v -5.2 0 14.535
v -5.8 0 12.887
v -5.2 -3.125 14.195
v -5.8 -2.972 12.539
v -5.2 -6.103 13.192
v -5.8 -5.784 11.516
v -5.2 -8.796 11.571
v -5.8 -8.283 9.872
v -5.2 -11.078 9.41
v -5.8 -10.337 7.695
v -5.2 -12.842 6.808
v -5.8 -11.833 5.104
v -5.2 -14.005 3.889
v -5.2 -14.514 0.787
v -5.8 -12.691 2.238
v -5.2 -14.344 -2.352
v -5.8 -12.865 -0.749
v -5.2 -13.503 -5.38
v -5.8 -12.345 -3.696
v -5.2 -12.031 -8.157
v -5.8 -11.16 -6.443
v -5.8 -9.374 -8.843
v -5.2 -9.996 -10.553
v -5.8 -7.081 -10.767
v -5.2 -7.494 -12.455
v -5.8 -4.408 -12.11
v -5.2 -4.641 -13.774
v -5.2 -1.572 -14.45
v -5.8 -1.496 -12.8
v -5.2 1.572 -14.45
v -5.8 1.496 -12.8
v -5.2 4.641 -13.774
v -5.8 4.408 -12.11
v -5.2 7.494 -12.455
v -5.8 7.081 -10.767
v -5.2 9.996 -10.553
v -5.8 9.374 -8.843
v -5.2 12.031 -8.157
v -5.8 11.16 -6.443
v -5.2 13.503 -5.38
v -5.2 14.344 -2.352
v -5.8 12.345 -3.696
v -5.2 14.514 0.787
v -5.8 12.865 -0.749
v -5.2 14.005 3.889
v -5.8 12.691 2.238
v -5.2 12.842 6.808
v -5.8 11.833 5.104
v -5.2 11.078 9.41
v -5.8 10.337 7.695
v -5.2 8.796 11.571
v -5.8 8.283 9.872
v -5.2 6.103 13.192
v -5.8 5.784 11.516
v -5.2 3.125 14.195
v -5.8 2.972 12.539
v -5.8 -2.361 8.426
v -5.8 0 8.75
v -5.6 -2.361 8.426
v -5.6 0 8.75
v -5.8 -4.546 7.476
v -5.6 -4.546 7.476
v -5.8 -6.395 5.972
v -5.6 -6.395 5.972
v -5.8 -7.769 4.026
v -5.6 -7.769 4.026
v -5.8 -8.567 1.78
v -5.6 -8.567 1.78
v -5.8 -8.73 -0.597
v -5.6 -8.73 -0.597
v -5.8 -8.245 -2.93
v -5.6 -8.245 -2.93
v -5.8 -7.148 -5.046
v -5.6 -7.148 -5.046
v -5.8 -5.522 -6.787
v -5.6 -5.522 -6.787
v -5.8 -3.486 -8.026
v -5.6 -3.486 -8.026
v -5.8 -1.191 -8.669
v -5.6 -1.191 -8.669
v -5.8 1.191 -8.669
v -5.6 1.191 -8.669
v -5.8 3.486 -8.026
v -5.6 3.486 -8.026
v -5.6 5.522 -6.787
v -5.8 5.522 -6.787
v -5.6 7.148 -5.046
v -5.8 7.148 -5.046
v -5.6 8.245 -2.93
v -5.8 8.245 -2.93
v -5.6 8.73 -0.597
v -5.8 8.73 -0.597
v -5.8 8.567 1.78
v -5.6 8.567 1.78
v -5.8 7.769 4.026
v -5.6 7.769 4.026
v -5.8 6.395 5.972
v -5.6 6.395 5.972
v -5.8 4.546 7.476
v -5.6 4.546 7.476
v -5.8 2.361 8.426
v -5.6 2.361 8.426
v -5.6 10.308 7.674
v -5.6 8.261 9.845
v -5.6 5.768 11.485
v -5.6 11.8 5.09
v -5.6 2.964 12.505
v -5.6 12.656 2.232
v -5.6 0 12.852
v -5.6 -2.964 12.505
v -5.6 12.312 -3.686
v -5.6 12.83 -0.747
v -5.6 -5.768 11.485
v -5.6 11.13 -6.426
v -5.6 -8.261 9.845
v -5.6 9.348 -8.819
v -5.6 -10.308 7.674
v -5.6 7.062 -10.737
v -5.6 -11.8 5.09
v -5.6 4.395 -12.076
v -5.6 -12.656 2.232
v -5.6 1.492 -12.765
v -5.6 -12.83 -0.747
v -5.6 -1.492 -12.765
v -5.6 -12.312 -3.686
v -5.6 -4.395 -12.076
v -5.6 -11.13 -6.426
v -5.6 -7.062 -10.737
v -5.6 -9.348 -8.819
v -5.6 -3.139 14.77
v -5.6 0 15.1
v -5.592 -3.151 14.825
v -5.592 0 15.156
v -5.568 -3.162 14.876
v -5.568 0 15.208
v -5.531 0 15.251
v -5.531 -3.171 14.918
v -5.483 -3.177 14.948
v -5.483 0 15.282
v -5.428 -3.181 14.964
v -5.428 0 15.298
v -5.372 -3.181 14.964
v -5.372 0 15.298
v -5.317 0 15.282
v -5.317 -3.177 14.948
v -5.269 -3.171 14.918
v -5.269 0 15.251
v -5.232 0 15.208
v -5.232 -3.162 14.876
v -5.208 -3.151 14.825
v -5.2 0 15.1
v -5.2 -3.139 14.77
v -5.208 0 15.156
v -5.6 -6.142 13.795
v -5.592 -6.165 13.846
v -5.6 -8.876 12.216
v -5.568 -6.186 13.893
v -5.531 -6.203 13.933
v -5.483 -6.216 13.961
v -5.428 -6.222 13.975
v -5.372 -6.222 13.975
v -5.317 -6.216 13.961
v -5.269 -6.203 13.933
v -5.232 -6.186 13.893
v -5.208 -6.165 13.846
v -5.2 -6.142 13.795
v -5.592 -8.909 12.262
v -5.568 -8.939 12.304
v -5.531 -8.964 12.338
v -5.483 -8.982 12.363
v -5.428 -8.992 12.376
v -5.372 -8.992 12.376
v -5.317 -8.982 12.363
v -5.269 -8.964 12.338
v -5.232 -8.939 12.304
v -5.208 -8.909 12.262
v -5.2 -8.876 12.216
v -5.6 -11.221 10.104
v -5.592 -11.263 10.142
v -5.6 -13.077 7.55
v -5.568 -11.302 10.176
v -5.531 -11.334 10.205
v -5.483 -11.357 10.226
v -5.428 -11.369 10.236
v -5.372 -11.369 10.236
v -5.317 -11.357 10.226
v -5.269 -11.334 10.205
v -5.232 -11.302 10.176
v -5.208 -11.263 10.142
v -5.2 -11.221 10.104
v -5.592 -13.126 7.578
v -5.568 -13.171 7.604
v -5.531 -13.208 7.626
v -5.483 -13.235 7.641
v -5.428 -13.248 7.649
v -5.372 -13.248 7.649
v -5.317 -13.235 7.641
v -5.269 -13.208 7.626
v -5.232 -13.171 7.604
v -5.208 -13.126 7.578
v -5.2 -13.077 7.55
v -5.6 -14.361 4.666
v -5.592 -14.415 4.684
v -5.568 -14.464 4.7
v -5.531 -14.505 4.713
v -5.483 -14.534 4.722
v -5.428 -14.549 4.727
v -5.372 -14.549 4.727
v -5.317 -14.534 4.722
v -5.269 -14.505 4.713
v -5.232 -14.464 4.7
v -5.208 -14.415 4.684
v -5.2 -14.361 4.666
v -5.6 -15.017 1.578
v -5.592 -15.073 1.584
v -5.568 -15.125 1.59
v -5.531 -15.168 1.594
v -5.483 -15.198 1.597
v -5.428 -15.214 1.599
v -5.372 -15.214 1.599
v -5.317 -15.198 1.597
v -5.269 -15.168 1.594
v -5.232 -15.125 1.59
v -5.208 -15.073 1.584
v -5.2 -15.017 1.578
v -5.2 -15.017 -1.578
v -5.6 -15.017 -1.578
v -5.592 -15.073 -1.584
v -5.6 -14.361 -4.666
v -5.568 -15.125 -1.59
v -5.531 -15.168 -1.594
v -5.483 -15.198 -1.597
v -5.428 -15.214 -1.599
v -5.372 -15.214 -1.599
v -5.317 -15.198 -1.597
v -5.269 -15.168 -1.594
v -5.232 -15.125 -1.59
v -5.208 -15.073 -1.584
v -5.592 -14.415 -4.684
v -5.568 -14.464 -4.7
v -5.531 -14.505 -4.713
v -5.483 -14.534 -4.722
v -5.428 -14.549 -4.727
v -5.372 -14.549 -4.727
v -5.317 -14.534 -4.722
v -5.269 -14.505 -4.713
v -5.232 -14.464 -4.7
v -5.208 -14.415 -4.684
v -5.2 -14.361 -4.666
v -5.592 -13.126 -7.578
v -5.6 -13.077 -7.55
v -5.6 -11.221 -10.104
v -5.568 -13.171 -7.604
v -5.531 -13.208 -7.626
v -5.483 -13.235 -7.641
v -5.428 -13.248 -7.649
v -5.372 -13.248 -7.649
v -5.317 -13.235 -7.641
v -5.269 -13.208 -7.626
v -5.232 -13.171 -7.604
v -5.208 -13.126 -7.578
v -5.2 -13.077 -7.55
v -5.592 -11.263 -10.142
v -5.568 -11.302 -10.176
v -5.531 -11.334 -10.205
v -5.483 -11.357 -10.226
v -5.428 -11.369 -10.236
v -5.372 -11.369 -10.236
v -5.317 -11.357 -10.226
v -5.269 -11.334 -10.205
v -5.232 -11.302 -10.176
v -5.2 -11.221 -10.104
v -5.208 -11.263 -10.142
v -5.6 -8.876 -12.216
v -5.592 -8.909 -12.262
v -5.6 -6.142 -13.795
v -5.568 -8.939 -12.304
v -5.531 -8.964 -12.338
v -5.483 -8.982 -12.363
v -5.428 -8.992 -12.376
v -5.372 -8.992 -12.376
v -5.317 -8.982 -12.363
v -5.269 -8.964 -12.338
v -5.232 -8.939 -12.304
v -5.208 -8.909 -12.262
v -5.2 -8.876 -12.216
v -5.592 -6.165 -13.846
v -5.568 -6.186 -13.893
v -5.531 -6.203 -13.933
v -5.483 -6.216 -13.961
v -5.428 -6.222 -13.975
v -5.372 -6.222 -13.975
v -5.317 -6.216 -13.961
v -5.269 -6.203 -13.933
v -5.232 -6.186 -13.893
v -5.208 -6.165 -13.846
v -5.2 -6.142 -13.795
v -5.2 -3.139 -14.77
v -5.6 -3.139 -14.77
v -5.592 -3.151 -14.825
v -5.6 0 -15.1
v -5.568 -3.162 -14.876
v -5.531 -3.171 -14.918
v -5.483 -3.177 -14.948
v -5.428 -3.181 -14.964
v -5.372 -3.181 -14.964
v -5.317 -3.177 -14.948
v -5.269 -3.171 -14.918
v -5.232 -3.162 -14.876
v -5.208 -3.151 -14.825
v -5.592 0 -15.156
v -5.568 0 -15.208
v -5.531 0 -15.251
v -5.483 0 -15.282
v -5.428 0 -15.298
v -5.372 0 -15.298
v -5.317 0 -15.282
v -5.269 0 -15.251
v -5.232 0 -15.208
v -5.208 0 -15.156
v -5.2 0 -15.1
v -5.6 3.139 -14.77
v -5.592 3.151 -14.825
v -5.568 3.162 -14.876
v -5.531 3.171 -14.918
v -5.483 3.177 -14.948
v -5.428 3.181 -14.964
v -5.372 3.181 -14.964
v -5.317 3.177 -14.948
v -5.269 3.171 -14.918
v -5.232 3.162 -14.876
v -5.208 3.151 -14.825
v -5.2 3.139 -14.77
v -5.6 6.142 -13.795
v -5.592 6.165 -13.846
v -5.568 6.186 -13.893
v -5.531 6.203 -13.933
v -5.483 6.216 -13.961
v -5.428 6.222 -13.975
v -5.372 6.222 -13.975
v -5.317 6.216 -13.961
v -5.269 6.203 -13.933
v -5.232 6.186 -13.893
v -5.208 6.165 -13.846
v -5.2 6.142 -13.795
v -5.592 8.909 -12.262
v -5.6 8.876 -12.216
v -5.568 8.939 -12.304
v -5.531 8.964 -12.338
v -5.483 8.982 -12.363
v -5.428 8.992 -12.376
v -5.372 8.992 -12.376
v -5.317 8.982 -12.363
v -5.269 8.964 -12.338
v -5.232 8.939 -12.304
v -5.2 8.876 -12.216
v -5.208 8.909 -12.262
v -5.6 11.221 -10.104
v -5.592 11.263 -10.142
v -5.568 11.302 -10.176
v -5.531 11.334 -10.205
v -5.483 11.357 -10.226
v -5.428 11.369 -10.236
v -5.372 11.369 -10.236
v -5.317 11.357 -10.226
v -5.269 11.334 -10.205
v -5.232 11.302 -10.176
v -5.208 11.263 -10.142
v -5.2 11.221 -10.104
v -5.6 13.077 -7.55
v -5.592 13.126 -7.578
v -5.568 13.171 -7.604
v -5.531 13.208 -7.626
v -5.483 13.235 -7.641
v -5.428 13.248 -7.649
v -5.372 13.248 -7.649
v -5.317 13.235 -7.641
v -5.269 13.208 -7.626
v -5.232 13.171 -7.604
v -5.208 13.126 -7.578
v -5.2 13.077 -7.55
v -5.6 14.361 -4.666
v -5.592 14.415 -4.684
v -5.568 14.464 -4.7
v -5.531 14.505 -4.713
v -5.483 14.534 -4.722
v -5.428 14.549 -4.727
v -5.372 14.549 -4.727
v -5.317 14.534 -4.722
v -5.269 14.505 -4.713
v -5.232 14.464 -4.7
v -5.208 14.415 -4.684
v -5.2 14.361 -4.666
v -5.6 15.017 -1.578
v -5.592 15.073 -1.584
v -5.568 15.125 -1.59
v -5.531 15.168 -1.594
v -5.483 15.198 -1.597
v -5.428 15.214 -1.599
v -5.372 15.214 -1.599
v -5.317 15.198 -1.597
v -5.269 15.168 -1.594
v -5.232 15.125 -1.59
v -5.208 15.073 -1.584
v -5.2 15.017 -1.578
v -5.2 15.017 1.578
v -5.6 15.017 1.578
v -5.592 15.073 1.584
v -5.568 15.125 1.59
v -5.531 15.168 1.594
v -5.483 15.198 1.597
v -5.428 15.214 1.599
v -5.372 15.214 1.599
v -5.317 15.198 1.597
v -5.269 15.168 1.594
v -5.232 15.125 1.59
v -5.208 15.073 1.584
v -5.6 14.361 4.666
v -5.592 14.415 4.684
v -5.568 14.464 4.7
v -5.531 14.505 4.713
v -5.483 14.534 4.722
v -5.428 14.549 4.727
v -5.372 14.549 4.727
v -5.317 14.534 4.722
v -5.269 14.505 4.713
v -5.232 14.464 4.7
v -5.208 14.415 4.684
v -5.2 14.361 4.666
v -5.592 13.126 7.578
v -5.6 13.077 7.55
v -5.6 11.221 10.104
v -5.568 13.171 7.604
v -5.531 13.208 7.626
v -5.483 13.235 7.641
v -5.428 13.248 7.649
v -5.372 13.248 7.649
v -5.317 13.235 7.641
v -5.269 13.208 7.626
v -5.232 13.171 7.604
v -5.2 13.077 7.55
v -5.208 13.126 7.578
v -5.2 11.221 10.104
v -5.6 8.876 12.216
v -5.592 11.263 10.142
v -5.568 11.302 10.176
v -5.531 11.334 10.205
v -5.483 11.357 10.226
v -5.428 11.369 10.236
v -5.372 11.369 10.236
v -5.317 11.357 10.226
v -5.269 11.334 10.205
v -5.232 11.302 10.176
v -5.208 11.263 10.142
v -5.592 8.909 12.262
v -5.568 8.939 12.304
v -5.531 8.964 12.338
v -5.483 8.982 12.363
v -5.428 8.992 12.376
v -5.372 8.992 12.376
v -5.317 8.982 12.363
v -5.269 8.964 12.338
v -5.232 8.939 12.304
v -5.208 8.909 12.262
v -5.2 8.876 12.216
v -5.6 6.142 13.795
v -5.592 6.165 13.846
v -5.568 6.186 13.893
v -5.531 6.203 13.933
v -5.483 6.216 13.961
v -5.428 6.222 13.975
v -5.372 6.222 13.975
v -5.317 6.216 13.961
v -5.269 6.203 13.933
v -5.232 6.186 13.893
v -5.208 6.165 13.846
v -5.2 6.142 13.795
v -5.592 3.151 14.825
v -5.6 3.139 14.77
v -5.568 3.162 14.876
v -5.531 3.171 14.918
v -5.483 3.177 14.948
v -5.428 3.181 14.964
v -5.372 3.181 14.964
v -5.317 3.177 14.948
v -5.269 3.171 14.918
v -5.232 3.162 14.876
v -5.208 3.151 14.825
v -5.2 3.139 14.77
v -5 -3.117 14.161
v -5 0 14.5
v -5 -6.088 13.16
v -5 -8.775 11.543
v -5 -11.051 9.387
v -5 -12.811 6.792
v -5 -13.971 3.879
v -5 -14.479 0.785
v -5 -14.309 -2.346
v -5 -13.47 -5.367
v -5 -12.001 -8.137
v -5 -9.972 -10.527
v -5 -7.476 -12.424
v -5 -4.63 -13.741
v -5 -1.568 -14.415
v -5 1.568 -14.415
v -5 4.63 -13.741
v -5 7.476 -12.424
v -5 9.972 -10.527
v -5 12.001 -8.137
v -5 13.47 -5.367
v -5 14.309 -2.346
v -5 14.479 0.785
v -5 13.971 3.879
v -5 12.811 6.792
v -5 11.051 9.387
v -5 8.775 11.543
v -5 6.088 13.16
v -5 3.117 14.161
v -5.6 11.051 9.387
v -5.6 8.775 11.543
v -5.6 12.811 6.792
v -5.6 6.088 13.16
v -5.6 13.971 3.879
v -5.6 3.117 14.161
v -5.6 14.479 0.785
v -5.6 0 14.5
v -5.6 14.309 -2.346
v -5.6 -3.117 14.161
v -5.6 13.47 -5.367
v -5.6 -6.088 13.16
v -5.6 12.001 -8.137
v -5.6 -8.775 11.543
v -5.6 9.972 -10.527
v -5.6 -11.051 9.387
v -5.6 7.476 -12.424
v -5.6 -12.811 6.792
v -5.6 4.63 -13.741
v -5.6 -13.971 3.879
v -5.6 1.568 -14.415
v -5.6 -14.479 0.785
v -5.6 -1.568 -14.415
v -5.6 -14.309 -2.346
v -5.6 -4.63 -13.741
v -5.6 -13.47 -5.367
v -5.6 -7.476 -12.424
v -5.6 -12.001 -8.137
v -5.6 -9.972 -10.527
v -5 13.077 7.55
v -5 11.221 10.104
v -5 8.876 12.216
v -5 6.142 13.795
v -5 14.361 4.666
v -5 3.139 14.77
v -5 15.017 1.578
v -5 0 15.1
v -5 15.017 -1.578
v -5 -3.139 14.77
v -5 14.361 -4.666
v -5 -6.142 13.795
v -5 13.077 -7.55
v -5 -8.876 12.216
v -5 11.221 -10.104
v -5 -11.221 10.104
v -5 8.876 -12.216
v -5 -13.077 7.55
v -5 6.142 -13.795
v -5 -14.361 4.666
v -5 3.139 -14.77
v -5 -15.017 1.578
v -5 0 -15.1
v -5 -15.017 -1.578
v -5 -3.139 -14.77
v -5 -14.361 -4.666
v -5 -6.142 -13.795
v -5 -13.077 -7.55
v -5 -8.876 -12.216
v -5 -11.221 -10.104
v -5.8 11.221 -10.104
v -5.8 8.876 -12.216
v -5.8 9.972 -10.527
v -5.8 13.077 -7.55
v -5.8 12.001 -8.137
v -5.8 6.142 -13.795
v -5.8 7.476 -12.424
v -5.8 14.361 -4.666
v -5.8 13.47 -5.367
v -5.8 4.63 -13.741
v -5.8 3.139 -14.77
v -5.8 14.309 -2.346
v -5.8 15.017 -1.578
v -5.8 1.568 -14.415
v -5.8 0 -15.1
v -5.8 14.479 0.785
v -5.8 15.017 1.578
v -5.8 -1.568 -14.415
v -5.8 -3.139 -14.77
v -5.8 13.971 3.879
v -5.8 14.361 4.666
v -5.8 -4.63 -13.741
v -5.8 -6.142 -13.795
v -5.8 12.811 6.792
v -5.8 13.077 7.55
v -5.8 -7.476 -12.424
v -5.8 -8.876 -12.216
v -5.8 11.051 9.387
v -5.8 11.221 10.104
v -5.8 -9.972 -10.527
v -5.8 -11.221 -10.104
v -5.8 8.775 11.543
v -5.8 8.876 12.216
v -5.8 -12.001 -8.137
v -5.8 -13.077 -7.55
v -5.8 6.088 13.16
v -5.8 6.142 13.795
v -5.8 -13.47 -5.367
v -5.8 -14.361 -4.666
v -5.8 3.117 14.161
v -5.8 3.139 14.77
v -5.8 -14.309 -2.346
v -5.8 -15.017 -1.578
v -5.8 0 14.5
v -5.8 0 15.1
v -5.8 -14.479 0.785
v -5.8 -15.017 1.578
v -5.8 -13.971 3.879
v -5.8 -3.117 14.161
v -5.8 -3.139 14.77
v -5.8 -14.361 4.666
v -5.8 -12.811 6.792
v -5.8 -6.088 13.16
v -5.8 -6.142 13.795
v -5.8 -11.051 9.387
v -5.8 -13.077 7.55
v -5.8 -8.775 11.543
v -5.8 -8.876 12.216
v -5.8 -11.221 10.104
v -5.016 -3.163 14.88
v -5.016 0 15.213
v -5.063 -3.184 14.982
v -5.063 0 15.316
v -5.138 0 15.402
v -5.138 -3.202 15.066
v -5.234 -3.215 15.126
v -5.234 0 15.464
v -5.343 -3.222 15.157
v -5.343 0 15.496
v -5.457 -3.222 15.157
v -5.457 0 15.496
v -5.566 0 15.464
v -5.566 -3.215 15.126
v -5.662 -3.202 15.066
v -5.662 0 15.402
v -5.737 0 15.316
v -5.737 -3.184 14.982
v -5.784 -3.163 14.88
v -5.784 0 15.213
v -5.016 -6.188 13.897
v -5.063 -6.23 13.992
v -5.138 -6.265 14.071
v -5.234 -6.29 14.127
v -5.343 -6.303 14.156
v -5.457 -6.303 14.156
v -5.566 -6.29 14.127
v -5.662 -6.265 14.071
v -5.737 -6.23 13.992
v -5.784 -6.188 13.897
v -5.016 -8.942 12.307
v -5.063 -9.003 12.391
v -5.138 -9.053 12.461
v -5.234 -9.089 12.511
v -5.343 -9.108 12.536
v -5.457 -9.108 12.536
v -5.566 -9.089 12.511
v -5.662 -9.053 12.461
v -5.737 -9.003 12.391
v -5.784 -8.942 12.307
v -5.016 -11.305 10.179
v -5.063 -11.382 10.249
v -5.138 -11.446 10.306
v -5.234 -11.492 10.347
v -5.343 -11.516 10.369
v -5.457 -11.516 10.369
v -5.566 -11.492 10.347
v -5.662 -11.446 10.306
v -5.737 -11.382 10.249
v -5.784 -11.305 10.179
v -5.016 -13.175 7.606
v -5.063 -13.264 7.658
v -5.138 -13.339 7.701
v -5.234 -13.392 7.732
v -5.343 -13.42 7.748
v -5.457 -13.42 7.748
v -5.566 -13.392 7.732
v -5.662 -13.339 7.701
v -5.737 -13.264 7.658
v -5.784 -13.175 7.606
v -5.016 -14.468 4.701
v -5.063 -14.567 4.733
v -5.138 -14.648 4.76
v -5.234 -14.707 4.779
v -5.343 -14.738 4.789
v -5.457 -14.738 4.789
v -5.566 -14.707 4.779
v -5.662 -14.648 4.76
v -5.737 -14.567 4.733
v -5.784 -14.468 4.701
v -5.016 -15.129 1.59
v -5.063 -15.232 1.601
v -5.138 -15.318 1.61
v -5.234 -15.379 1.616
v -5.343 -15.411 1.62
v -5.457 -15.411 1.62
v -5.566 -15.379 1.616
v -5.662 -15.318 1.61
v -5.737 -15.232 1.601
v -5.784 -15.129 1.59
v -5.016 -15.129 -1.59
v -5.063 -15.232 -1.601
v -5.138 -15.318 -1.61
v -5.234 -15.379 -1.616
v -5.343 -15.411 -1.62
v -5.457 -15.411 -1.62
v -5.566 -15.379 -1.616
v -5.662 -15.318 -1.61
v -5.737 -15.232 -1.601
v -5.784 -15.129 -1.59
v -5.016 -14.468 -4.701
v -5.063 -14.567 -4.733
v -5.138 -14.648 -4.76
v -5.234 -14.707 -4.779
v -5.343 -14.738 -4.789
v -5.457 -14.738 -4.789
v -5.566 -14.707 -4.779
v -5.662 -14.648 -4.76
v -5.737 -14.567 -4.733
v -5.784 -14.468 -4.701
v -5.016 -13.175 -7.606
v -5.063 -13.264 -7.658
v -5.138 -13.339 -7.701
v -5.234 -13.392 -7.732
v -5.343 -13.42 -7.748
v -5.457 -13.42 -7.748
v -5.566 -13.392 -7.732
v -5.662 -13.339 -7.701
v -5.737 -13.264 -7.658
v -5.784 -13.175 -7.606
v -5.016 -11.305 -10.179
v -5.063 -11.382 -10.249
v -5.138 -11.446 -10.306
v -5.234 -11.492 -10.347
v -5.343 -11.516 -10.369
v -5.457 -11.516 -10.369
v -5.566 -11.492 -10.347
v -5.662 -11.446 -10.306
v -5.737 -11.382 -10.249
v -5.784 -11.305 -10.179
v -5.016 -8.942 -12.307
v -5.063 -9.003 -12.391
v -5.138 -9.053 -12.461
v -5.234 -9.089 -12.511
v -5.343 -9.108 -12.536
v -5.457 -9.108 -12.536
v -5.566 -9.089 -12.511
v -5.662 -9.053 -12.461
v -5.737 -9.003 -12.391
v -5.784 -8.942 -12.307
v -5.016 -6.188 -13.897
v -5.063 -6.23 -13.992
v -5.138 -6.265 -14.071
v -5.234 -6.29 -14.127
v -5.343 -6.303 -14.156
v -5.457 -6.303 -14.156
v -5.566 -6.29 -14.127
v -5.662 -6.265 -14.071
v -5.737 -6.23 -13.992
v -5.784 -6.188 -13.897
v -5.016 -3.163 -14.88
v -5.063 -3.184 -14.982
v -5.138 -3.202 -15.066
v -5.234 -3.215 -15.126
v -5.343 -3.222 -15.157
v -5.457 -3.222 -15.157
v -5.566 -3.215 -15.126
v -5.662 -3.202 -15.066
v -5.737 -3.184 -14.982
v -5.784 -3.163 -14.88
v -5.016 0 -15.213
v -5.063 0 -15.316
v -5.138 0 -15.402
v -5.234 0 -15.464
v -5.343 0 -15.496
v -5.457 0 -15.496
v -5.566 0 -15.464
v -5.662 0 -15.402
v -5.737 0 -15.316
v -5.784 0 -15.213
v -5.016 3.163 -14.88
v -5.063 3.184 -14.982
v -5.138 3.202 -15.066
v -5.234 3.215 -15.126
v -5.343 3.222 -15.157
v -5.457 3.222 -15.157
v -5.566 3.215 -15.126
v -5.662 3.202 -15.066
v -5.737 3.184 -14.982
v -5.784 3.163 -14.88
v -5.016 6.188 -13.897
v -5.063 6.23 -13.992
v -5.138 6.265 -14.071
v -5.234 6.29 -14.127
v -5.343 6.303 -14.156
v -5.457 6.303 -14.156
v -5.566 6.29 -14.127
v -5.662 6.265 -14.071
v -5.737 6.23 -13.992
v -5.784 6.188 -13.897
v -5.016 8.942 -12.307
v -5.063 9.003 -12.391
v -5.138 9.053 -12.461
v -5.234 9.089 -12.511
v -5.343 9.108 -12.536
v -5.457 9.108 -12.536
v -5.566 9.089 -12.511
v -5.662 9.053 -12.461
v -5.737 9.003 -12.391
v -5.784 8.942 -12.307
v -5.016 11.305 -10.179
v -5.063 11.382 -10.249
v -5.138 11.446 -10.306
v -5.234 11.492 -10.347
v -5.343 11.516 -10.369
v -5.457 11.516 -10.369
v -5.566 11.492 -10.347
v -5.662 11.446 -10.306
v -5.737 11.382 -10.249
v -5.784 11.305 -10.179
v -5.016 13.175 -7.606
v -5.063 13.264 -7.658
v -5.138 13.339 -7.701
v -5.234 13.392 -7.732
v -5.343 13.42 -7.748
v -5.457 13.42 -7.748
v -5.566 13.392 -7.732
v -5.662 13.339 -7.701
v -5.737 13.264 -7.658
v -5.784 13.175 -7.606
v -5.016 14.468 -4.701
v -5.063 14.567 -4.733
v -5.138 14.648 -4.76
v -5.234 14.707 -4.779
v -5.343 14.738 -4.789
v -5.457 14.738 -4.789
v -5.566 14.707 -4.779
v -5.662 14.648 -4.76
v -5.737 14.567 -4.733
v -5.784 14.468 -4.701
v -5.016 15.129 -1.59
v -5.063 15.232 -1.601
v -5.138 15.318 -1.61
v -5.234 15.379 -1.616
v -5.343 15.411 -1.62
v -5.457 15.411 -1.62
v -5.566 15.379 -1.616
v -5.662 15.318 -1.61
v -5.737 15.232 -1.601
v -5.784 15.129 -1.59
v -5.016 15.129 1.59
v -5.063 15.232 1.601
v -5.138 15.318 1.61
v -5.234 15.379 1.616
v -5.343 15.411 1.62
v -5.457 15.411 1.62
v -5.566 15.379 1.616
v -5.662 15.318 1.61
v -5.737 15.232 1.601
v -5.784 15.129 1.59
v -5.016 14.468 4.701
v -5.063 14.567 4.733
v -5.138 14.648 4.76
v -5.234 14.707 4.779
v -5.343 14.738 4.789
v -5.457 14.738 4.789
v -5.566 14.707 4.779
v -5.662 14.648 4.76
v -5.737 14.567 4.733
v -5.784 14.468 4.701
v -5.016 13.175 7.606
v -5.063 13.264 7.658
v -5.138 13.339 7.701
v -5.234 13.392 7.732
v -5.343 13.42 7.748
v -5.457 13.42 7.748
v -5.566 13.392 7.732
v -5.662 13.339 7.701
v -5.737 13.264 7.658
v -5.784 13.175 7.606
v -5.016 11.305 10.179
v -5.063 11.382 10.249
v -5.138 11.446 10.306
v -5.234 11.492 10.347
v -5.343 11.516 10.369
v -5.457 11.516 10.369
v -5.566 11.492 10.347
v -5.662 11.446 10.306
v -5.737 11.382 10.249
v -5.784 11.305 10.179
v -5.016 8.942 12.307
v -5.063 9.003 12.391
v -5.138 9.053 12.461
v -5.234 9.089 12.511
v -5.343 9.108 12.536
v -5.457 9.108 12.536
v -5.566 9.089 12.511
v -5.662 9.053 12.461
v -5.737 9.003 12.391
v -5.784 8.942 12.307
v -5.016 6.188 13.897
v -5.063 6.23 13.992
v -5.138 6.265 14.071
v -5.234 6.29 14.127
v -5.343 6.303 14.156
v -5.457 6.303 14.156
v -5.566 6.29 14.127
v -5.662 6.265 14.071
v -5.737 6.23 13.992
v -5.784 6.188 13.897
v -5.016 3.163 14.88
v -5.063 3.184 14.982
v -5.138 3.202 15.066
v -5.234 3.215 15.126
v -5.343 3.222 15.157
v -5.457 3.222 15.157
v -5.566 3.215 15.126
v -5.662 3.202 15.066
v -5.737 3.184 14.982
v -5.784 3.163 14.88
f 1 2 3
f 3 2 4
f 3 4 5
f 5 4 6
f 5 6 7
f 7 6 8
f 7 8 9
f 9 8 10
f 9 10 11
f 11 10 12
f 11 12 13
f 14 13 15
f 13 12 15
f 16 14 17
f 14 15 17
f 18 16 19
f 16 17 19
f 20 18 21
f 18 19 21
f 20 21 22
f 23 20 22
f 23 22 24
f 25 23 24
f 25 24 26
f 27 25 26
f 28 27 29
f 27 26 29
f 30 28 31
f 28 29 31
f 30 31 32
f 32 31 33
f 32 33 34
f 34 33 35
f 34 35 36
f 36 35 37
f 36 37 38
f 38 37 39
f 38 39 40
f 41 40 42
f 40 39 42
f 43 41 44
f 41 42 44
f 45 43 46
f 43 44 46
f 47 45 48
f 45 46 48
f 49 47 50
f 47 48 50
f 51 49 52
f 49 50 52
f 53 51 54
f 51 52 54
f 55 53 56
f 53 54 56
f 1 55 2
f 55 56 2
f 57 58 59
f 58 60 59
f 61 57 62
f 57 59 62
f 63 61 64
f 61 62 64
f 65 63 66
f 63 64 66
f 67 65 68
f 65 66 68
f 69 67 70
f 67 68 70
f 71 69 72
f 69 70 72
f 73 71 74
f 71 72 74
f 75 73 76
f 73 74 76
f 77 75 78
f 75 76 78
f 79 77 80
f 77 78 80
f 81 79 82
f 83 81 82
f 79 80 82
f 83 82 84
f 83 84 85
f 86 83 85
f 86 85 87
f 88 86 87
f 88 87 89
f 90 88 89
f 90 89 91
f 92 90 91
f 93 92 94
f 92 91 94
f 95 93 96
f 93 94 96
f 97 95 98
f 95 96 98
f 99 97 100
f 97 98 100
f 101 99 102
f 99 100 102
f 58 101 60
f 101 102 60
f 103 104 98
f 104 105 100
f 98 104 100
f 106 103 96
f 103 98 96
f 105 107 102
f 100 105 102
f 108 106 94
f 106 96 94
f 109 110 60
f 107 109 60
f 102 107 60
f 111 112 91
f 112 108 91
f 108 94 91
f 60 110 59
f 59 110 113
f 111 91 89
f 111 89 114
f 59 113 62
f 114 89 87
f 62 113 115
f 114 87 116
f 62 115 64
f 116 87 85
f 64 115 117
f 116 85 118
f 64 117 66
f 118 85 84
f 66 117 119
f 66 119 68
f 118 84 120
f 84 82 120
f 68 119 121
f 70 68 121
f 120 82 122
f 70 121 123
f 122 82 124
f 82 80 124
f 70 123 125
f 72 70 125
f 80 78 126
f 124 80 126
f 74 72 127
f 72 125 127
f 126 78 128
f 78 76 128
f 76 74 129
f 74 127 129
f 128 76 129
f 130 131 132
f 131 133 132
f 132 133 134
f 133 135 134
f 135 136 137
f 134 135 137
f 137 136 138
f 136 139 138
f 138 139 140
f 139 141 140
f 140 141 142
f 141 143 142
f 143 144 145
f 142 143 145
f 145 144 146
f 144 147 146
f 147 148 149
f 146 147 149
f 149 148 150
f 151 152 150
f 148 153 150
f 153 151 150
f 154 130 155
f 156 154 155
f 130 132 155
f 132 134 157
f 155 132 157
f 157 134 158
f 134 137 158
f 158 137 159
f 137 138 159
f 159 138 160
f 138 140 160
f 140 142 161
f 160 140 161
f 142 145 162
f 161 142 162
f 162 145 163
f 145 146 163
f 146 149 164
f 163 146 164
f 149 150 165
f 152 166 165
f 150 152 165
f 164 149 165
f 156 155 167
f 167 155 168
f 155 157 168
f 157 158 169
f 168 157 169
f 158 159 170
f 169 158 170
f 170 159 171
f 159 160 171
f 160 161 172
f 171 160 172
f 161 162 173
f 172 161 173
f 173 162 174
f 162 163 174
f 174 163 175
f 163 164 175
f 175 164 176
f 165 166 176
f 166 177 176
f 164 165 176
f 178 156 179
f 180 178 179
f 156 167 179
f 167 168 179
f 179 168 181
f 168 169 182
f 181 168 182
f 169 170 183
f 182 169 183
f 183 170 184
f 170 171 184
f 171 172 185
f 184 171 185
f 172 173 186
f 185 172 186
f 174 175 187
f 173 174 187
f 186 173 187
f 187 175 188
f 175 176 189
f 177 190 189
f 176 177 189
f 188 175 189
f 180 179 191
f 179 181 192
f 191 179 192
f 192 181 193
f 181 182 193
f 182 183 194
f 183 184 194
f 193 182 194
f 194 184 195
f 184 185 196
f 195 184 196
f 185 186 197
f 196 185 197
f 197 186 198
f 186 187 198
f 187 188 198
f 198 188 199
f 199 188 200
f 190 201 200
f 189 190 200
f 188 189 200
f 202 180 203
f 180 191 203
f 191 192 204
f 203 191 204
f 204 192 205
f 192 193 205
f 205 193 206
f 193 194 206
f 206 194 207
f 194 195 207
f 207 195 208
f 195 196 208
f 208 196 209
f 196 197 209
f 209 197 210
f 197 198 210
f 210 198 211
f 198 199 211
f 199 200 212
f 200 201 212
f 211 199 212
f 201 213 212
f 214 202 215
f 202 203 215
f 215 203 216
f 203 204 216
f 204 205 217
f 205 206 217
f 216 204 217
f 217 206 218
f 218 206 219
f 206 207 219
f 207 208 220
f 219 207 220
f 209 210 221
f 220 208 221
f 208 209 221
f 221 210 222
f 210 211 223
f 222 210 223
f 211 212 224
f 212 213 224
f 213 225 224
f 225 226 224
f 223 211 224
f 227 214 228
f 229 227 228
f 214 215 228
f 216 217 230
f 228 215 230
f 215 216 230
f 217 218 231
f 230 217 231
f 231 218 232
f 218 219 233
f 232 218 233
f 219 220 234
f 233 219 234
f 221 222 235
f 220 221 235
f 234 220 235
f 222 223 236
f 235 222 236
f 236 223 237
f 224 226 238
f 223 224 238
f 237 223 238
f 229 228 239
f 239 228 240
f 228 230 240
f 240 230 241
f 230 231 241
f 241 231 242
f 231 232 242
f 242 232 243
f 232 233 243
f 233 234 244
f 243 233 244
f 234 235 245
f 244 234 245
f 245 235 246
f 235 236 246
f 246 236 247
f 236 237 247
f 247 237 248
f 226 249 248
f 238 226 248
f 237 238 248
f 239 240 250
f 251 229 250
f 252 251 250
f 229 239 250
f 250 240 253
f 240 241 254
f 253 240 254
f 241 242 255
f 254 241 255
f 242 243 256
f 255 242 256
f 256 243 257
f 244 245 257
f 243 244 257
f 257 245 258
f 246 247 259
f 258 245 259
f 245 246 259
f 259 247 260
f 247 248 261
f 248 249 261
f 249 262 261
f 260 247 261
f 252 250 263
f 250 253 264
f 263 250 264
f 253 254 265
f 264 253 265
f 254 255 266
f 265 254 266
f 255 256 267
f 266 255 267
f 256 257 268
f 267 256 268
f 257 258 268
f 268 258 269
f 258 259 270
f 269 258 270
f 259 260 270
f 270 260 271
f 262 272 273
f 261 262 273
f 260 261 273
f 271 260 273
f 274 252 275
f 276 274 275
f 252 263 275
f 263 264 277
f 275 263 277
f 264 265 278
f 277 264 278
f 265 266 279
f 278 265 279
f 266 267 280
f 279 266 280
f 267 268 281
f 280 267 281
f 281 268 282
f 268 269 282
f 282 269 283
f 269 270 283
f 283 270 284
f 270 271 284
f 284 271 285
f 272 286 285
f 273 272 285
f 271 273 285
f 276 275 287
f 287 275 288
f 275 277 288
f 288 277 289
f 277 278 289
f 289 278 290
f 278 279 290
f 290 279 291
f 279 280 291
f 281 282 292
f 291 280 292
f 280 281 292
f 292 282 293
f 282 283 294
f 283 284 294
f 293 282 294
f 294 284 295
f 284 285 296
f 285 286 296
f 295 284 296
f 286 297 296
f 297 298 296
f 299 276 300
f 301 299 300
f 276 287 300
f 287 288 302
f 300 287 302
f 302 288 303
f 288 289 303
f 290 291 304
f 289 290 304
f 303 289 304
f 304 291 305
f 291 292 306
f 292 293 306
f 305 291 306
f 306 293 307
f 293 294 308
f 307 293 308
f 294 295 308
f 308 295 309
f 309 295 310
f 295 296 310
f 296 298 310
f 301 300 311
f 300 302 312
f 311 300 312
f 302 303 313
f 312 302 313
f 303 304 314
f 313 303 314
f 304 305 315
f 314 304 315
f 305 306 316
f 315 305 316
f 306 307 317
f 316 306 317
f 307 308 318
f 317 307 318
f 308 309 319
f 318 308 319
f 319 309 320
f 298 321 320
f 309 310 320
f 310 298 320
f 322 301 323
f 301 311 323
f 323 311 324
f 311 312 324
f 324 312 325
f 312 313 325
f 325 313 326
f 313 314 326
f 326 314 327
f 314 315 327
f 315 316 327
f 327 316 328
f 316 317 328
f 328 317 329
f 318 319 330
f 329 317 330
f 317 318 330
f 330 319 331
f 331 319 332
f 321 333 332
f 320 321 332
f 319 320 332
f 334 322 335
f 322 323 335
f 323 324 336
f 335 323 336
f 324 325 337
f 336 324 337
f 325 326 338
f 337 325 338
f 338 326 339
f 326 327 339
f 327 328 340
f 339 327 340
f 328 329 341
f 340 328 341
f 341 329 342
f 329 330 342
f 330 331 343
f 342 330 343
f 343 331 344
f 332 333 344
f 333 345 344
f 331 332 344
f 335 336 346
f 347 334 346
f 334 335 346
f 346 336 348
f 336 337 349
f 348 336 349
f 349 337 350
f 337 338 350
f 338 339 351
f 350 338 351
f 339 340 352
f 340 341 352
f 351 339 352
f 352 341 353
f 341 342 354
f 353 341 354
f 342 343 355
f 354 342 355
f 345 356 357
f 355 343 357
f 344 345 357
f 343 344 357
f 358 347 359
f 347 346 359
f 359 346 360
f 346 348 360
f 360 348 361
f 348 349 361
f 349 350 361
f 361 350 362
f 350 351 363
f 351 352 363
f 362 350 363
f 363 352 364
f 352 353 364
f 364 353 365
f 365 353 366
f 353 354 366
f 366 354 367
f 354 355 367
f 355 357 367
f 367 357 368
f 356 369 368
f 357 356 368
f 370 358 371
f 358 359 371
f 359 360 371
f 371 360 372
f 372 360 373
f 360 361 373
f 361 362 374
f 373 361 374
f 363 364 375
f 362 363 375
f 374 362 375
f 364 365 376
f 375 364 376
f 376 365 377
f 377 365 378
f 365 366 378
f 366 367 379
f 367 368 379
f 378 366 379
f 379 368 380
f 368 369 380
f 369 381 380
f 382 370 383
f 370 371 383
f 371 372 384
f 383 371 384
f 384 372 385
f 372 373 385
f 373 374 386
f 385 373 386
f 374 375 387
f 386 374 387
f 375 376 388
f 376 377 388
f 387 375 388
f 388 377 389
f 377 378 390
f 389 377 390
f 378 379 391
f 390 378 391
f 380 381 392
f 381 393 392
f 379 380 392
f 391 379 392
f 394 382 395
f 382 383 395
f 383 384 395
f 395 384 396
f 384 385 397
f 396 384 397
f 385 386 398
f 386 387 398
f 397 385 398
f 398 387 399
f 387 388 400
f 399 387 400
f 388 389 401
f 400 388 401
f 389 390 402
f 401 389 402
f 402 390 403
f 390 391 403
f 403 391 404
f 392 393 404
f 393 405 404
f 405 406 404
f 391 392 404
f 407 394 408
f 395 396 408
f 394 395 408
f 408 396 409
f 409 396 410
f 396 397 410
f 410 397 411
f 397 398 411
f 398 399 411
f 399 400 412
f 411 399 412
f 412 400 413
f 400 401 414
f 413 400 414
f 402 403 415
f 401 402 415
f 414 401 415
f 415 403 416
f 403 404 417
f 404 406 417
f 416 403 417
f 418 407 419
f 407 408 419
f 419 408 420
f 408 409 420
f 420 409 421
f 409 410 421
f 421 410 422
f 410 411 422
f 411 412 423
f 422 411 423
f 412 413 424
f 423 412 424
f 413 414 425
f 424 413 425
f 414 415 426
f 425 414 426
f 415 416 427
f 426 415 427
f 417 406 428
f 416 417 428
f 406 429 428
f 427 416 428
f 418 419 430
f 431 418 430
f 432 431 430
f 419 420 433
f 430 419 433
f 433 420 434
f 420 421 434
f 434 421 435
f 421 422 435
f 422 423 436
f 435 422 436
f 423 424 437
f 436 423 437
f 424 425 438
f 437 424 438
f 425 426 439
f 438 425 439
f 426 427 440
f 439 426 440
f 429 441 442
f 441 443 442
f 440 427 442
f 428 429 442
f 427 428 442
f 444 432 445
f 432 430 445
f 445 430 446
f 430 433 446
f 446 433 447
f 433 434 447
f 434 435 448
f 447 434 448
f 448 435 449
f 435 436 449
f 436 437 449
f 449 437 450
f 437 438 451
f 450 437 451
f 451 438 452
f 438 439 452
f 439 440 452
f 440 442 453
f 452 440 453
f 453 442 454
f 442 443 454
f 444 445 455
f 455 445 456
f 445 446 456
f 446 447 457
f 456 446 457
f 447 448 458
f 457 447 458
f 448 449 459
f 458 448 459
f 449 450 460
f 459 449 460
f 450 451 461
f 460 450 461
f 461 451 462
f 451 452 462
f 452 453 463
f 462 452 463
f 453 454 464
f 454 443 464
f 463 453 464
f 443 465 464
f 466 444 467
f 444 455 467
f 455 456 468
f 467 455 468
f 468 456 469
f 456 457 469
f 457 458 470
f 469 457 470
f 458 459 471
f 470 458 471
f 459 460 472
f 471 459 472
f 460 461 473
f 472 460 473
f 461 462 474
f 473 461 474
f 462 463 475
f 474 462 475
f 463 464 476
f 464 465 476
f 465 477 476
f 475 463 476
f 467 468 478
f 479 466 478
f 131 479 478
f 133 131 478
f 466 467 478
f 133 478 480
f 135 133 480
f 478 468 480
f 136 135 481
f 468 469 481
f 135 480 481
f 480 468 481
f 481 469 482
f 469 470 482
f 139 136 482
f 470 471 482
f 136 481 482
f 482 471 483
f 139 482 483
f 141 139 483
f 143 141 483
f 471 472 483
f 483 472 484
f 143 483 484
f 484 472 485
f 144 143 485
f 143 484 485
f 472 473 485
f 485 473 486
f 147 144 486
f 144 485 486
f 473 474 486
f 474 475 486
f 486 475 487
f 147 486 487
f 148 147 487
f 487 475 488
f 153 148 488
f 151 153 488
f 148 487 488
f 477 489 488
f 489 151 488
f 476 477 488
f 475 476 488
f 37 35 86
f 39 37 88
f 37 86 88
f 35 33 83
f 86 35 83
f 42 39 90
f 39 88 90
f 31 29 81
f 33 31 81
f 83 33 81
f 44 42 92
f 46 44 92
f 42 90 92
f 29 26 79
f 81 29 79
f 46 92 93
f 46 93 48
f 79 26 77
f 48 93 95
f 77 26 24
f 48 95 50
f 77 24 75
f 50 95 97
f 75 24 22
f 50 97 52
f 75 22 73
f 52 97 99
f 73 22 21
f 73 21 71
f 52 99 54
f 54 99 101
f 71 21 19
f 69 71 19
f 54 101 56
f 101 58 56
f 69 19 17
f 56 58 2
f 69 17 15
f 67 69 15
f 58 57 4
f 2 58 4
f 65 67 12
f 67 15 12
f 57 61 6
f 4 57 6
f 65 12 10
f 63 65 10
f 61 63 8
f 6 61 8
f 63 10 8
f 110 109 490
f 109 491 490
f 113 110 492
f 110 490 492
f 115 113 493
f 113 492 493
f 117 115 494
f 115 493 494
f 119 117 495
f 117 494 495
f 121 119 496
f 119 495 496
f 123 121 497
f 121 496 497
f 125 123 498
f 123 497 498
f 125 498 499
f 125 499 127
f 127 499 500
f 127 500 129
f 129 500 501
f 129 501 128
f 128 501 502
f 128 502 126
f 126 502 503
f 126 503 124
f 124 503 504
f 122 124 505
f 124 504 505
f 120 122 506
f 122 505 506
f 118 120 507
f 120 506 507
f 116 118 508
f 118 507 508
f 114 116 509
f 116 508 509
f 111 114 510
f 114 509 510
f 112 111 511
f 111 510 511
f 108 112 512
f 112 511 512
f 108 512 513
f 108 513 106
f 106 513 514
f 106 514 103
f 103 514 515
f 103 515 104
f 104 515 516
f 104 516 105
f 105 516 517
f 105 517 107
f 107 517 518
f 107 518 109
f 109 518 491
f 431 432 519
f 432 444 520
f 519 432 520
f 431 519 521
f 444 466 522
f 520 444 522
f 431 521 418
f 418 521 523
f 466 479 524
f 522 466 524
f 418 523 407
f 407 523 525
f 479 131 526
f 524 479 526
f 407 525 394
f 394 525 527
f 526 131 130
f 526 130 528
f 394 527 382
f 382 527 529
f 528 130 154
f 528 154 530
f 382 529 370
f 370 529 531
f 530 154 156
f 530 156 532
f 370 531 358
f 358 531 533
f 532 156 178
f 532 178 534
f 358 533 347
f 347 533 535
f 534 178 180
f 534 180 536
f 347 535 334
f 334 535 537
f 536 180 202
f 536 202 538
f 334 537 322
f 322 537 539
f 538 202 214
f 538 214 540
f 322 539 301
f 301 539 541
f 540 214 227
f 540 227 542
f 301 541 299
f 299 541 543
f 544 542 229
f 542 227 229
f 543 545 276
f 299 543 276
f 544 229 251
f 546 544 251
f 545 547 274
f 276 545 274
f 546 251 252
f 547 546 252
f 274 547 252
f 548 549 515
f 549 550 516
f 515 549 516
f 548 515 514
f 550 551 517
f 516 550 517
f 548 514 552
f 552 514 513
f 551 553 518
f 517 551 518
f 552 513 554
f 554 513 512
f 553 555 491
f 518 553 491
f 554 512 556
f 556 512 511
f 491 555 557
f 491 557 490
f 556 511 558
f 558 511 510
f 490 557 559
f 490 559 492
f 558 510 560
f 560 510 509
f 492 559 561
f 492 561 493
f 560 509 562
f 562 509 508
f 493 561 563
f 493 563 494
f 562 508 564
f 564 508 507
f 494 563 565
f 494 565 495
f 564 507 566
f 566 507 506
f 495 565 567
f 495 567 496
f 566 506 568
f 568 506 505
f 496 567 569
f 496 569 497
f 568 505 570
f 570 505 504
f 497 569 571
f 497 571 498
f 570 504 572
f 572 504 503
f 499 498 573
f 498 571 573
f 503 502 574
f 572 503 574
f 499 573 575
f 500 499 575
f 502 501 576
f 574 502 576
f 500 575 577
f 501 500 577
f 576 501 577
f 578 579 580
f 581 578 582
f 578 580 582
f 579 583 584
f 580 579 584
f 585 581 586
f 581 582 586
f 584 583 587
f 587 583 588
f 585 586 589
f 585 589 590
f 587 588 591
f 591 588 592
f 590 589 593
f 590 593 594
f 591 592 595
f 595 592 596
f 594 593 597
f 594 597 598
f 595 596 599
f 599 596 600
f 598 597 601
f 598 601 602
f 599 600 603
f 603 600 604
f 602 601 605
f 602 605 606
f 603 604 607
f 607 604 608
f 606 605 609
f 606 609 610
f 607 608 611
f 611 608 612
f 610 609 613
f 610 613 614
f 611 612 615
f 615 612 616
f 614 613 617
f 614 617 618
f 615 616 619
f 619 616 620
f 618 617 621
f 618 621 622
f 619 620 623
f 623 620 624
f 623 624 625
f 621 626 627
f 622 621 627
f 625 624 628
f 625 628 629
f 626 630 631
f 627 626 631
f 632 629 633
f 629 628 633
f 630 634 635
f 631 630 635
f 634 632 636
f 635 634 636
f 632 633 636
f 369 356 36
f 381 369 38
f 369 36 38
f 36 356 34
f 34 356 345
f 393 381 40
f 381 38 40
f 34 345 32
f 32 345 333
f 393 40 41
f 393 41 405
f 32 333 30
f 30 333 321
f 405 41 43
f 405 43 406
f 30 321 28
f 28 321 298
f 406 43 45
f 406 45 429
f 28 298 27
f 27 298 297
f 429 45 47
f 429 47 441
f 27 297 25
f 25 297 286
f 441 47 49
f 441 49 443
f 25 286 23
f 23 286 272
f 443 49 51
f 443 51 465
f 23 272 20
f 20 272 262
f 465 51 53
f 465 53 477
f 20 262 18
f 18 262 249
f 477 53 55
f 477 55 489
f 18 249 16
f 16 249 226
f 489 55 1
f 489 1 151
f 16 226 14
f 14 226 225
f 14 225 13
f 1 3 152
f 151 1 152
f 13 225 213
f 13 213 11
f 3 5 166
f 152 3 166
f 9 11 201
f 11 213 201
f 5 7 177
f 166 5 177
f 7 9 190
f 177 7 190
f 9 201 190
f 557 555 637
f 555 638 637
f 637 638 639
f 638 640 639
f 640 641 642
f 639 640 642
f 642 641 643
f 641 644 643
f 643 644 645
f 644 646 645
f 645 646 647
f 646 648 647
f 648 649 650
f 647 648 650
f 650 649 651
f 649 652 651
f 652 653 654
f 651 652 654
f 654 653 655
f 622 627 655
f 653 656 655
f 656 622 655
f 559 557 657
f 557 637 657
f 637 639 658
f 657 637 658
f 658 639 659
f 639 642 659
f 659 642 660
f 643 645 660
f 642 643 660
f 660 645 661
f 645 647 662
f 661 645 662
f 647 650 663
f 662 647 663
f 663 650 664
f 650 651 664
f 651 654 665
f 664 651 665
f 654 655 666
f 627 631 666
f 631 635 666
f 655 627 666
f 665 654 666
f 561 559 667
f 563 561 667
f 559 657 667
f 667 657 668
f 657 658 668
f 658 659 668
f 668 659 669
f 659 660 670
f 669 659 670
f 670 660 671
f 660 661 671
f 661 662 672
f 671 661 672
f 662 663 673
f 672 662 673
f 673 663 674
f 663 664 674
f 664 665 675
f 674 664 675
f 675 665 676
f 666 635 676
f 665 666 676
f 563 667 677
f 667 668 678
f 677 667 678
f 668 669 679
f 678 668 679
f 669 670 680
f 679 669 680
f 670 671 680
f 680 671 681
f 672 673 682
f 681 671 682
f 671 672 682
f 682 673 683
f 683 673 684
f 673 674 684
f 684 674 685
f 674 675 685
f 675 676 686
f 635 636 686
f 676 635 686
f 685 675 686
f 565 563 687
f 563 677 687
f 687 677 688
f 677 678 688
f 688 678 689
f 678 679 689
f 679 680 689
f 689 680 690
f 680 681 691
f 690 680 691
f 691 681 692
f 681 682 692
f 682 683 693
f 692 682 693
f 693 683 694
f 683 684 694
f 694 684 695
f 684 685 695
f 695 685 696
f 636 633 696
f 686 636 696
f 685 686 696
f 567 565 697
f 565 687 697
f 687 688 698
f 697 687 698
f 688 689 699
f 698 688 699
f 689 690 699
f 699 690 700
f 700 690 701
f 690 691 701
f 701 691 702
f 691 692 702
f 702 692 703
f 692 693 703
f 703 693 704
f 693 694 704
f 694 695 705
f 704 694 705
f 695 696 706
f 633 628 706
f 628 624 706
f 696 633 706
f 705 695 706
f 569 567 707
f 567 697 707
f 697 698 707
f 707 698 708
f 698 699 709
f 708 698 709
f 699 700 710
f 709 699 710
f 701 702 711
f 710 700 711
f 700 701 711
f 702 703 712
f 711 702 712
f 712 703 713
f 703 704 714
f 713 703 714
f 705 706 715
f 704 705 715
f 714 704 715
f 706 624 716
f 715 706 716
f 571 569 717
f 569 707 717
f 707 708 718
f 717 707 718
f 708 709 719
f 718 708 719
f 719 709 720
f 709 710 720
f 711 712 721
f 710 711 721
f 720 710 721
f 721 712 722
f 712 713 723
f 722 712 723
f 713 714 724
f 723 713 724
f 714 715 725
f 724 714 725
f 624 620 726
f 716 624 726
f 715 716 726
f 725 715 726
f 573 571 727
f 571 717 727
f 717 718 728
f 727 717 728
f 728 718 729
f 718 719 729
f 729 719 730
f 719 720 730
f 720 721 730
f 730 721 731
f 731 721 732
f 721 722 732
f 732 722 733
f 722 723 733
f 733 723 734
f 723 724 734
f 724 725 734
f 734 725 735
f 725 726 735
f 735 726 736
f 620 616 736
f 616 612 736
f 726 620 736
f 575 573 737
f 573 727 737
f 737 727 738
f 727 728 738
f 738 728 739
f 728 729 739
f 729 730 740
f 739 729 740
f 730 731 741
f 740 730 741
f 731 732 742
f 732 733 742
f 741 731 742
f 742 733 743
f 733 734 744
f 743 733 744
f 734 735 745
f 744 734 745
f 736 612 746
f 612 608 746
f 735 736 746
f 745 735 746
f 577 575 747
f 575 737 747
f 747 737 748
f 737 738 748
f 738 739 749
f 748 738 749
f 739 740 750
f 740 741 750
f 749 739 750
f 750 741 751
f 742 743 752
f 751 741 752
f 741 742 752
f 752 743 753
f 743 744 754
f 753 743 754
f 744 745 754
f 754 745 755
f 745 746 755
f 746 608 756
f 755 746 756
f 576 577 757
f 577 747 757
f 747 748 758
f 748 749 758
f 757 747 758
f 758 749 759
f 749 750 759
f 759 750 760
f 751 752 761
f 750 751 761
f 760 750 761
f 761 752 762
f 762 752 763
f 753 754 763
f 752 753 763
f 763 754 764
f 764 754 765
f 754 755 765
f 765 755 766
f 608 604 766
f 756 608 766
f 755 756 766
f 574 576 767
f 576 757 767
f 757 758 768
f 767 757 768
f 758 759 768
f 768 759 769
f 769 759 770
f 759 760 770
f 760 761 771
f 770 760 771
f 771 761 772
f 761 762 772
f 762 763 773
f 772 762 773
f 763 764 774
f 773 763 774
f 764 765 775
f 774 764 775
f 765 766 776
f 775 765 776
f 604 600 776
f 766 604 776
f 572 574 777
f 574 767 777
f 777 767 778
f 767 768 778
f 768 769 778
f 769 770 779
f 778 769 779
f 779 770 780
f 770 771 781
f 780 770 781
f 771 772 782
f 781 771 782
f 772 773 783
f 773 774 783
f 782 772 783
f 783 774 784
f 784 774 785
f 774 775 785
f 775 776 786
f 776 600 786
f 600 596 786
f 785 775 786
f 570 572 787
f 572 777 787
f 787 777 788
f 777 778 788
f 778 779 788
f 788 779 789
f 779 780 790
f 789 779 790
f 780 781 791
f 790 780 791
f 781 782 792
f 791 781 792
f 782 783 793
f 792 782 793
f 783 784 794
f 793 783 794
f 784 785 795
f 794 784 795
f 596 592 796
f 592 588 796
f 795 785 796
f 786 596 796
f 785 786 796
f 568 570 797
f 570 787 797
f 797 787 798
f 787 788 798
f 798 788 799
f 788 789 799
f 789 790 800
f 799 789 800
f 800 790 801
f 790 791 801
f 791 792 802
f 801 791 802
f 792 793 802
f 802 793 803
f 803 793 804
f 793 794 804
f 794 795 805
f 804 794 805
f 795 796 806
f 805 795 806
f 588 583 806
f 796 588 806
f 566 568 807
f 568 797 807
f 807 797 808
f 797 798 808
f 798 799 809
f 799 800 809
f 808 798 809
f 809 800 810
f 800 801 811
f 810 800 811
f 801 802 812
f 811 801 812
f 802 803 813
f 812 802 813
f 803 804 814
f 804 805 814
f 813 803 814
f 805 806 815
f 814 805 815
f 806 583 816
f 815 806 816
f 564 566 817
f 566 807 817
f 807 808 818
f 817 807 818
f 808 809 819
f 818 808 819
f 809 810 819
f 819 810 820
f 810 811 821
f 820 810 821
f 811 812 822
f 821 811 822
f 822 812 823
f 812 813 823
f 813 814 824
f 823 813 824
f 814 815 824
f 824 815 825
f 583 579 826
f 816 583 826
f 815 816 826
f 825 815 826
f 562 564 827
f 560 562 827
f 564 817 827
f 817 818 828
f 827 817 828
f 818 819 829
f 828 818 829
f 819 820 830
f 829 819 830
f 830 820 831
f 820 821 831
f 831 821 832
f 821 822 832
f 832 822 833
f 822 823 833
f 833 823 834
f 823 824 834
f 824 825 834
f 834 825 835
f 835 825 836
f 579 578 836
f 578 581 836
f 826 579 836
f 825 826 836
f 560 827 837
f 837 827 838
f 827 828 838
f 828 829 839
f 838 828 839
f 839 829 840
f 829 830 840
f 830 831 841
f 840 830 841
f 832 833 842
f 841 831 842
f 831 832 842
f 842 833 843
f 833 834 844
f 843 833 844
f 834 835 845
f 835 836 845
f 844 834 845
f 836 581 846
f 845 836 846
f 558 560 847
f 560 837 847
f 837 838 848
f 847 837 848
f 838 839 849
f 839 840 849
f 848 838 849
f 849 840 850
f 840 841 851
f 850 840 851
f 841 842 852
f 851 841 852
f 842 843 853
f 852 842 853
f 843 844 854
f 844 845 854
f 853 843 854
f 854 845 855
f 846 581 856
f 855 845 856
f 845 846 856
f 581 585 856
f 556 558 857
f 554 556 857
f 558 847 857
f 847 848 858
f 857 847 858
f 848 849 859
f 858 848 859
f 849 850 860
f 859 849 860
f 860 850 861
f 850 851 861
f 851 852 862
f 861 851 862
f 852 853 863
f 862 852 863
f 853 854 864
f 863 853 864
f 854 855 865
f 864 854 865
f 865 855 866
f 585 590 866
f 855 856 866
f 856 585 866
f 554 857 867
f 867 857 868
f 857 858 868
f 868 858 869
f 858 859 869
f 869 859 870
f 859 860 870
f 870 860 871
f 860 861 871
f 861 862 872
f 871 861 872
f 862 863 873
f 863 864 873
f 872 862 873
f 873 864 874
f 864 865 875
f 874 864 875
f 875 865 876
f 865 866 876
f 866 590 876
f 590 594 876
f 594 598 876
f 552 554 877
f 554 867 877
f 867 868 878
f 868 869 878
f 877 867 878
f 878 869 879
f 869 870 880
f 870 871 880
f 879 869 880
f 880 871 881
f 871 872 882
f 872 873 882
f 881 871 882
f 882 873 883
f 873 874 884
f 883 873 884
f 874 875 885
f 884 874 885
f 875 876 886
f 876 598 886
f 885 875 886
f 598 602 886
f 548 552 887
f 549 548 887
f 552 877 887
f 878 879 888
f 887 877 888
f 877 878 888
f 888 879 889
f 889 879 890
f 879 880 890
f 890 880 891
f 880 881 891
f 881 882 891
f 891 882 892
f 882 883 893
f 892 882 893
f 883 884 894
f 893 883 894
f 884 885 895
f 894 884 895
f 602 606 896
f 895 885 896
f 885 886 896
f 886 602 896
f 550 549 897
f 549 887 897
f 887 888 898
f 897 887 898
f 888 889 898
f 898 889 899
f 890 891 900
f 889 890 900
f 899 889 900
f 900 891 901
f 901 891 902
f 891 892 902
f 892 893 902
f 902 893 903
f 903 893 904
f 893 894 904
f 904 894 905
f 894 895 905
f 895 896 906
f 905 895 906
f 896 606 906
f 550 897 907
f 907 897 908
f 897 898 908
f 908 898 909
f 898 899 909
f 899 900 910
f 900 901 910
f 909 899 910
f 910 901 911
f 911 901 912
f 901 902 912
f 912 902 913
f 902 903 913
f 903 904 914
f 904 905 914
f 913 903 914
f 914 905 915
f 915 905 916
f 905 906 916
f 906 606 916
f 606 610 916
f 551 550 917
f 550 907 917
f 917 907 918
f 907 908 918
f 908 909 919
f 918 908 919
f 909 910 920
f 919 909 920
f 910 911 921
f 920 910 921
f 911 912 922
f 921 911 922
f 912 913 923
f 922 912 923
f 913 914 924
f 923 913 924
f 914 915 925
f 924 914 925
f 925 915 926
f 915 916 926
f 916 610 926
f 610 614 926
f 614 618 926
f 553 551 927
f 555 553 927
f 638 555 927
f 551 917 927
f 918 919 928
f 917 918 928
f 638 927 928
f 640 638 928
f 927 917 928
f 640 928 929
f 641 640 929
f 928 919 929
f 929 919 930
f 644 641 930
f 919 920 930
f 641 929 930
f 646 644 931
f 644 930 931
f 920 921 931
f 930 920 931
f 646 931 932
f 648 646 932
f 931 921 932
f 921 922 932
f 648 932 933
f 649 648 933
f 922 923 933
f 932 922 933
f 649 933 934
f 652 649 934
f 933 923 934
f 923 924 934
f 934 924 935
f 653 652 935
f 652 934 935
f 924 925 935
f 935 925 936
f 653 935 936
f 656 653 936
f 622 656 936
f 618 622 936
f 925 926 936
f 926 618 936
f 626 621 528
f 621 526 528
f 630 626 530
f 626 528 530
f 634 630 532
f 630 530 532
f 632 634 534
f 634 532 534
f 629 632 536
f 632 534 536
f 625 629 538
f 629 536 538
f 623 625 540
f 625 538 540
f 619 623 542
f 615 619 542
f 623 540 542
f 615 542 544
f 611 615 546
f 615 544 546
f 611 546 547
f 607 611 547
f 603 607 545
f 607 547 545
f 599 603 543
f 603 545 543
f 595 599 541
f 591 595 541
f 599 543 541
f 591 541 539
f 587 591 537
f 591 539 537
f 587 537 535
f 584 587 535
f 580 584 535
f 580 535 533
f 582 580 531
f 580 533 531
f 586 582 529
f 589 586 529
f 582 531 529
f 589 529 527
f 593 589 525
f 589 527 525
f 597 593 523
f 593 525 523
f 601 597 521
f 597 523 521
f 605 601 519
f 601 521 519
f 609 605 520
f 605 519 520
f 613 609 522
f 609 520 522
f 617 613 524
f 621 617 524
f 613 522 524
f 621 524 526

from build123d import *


with BuildPart() as part:
    # Sketch1 → Revolve1 (revolve)
    with BuildSketch(Plane.XY, mode=Mode.PRIVATE) as revolve1_sk:
        with BuildLine():
            Line((-5.8, 9), (-5.8, 8.75))
            Line((-5.8, 8.75), (-5.6, 8.75))
            Line((-5.6, 8.75), (-5.6, 9))
            Line((-5.6, 9), (-5.6, 12.851513548))
            Line((-5.6, 12.851513548), (-5, 14.5))
            Line((-5, 14.5), (-5, 15.1))
            ThreePointArc((-5, 15.1), (-5.4, 15.5), (-5.8, 15.1))
            Line((-5.8, 15.1), (-5.8, 14.5))
            Line((-5.8, 14.5), (-5.6, 14.5))
            Line((-5.6, 14.5), (-5.6, 15.1))
            ThreePointArc((-5.6, 15.1), (-5.4, 15.3), (-5.2, 15.1))
            Line((-5.2, 15.1), (-5.2, 14.535265396))
            Line((-5.2, 14.535265396), (-5.8, 12.886778944))
            Line((-5.8, 12.886778944), (-5.8, 9))
        make_face()
    revolve(revolve1_sk.sketch.rotate(Axis((-6, 0, 0), (1, 0, 0)), 90), axis=Axis((-6, 0, 0), (1, 0, 0)))


solid = part.part
